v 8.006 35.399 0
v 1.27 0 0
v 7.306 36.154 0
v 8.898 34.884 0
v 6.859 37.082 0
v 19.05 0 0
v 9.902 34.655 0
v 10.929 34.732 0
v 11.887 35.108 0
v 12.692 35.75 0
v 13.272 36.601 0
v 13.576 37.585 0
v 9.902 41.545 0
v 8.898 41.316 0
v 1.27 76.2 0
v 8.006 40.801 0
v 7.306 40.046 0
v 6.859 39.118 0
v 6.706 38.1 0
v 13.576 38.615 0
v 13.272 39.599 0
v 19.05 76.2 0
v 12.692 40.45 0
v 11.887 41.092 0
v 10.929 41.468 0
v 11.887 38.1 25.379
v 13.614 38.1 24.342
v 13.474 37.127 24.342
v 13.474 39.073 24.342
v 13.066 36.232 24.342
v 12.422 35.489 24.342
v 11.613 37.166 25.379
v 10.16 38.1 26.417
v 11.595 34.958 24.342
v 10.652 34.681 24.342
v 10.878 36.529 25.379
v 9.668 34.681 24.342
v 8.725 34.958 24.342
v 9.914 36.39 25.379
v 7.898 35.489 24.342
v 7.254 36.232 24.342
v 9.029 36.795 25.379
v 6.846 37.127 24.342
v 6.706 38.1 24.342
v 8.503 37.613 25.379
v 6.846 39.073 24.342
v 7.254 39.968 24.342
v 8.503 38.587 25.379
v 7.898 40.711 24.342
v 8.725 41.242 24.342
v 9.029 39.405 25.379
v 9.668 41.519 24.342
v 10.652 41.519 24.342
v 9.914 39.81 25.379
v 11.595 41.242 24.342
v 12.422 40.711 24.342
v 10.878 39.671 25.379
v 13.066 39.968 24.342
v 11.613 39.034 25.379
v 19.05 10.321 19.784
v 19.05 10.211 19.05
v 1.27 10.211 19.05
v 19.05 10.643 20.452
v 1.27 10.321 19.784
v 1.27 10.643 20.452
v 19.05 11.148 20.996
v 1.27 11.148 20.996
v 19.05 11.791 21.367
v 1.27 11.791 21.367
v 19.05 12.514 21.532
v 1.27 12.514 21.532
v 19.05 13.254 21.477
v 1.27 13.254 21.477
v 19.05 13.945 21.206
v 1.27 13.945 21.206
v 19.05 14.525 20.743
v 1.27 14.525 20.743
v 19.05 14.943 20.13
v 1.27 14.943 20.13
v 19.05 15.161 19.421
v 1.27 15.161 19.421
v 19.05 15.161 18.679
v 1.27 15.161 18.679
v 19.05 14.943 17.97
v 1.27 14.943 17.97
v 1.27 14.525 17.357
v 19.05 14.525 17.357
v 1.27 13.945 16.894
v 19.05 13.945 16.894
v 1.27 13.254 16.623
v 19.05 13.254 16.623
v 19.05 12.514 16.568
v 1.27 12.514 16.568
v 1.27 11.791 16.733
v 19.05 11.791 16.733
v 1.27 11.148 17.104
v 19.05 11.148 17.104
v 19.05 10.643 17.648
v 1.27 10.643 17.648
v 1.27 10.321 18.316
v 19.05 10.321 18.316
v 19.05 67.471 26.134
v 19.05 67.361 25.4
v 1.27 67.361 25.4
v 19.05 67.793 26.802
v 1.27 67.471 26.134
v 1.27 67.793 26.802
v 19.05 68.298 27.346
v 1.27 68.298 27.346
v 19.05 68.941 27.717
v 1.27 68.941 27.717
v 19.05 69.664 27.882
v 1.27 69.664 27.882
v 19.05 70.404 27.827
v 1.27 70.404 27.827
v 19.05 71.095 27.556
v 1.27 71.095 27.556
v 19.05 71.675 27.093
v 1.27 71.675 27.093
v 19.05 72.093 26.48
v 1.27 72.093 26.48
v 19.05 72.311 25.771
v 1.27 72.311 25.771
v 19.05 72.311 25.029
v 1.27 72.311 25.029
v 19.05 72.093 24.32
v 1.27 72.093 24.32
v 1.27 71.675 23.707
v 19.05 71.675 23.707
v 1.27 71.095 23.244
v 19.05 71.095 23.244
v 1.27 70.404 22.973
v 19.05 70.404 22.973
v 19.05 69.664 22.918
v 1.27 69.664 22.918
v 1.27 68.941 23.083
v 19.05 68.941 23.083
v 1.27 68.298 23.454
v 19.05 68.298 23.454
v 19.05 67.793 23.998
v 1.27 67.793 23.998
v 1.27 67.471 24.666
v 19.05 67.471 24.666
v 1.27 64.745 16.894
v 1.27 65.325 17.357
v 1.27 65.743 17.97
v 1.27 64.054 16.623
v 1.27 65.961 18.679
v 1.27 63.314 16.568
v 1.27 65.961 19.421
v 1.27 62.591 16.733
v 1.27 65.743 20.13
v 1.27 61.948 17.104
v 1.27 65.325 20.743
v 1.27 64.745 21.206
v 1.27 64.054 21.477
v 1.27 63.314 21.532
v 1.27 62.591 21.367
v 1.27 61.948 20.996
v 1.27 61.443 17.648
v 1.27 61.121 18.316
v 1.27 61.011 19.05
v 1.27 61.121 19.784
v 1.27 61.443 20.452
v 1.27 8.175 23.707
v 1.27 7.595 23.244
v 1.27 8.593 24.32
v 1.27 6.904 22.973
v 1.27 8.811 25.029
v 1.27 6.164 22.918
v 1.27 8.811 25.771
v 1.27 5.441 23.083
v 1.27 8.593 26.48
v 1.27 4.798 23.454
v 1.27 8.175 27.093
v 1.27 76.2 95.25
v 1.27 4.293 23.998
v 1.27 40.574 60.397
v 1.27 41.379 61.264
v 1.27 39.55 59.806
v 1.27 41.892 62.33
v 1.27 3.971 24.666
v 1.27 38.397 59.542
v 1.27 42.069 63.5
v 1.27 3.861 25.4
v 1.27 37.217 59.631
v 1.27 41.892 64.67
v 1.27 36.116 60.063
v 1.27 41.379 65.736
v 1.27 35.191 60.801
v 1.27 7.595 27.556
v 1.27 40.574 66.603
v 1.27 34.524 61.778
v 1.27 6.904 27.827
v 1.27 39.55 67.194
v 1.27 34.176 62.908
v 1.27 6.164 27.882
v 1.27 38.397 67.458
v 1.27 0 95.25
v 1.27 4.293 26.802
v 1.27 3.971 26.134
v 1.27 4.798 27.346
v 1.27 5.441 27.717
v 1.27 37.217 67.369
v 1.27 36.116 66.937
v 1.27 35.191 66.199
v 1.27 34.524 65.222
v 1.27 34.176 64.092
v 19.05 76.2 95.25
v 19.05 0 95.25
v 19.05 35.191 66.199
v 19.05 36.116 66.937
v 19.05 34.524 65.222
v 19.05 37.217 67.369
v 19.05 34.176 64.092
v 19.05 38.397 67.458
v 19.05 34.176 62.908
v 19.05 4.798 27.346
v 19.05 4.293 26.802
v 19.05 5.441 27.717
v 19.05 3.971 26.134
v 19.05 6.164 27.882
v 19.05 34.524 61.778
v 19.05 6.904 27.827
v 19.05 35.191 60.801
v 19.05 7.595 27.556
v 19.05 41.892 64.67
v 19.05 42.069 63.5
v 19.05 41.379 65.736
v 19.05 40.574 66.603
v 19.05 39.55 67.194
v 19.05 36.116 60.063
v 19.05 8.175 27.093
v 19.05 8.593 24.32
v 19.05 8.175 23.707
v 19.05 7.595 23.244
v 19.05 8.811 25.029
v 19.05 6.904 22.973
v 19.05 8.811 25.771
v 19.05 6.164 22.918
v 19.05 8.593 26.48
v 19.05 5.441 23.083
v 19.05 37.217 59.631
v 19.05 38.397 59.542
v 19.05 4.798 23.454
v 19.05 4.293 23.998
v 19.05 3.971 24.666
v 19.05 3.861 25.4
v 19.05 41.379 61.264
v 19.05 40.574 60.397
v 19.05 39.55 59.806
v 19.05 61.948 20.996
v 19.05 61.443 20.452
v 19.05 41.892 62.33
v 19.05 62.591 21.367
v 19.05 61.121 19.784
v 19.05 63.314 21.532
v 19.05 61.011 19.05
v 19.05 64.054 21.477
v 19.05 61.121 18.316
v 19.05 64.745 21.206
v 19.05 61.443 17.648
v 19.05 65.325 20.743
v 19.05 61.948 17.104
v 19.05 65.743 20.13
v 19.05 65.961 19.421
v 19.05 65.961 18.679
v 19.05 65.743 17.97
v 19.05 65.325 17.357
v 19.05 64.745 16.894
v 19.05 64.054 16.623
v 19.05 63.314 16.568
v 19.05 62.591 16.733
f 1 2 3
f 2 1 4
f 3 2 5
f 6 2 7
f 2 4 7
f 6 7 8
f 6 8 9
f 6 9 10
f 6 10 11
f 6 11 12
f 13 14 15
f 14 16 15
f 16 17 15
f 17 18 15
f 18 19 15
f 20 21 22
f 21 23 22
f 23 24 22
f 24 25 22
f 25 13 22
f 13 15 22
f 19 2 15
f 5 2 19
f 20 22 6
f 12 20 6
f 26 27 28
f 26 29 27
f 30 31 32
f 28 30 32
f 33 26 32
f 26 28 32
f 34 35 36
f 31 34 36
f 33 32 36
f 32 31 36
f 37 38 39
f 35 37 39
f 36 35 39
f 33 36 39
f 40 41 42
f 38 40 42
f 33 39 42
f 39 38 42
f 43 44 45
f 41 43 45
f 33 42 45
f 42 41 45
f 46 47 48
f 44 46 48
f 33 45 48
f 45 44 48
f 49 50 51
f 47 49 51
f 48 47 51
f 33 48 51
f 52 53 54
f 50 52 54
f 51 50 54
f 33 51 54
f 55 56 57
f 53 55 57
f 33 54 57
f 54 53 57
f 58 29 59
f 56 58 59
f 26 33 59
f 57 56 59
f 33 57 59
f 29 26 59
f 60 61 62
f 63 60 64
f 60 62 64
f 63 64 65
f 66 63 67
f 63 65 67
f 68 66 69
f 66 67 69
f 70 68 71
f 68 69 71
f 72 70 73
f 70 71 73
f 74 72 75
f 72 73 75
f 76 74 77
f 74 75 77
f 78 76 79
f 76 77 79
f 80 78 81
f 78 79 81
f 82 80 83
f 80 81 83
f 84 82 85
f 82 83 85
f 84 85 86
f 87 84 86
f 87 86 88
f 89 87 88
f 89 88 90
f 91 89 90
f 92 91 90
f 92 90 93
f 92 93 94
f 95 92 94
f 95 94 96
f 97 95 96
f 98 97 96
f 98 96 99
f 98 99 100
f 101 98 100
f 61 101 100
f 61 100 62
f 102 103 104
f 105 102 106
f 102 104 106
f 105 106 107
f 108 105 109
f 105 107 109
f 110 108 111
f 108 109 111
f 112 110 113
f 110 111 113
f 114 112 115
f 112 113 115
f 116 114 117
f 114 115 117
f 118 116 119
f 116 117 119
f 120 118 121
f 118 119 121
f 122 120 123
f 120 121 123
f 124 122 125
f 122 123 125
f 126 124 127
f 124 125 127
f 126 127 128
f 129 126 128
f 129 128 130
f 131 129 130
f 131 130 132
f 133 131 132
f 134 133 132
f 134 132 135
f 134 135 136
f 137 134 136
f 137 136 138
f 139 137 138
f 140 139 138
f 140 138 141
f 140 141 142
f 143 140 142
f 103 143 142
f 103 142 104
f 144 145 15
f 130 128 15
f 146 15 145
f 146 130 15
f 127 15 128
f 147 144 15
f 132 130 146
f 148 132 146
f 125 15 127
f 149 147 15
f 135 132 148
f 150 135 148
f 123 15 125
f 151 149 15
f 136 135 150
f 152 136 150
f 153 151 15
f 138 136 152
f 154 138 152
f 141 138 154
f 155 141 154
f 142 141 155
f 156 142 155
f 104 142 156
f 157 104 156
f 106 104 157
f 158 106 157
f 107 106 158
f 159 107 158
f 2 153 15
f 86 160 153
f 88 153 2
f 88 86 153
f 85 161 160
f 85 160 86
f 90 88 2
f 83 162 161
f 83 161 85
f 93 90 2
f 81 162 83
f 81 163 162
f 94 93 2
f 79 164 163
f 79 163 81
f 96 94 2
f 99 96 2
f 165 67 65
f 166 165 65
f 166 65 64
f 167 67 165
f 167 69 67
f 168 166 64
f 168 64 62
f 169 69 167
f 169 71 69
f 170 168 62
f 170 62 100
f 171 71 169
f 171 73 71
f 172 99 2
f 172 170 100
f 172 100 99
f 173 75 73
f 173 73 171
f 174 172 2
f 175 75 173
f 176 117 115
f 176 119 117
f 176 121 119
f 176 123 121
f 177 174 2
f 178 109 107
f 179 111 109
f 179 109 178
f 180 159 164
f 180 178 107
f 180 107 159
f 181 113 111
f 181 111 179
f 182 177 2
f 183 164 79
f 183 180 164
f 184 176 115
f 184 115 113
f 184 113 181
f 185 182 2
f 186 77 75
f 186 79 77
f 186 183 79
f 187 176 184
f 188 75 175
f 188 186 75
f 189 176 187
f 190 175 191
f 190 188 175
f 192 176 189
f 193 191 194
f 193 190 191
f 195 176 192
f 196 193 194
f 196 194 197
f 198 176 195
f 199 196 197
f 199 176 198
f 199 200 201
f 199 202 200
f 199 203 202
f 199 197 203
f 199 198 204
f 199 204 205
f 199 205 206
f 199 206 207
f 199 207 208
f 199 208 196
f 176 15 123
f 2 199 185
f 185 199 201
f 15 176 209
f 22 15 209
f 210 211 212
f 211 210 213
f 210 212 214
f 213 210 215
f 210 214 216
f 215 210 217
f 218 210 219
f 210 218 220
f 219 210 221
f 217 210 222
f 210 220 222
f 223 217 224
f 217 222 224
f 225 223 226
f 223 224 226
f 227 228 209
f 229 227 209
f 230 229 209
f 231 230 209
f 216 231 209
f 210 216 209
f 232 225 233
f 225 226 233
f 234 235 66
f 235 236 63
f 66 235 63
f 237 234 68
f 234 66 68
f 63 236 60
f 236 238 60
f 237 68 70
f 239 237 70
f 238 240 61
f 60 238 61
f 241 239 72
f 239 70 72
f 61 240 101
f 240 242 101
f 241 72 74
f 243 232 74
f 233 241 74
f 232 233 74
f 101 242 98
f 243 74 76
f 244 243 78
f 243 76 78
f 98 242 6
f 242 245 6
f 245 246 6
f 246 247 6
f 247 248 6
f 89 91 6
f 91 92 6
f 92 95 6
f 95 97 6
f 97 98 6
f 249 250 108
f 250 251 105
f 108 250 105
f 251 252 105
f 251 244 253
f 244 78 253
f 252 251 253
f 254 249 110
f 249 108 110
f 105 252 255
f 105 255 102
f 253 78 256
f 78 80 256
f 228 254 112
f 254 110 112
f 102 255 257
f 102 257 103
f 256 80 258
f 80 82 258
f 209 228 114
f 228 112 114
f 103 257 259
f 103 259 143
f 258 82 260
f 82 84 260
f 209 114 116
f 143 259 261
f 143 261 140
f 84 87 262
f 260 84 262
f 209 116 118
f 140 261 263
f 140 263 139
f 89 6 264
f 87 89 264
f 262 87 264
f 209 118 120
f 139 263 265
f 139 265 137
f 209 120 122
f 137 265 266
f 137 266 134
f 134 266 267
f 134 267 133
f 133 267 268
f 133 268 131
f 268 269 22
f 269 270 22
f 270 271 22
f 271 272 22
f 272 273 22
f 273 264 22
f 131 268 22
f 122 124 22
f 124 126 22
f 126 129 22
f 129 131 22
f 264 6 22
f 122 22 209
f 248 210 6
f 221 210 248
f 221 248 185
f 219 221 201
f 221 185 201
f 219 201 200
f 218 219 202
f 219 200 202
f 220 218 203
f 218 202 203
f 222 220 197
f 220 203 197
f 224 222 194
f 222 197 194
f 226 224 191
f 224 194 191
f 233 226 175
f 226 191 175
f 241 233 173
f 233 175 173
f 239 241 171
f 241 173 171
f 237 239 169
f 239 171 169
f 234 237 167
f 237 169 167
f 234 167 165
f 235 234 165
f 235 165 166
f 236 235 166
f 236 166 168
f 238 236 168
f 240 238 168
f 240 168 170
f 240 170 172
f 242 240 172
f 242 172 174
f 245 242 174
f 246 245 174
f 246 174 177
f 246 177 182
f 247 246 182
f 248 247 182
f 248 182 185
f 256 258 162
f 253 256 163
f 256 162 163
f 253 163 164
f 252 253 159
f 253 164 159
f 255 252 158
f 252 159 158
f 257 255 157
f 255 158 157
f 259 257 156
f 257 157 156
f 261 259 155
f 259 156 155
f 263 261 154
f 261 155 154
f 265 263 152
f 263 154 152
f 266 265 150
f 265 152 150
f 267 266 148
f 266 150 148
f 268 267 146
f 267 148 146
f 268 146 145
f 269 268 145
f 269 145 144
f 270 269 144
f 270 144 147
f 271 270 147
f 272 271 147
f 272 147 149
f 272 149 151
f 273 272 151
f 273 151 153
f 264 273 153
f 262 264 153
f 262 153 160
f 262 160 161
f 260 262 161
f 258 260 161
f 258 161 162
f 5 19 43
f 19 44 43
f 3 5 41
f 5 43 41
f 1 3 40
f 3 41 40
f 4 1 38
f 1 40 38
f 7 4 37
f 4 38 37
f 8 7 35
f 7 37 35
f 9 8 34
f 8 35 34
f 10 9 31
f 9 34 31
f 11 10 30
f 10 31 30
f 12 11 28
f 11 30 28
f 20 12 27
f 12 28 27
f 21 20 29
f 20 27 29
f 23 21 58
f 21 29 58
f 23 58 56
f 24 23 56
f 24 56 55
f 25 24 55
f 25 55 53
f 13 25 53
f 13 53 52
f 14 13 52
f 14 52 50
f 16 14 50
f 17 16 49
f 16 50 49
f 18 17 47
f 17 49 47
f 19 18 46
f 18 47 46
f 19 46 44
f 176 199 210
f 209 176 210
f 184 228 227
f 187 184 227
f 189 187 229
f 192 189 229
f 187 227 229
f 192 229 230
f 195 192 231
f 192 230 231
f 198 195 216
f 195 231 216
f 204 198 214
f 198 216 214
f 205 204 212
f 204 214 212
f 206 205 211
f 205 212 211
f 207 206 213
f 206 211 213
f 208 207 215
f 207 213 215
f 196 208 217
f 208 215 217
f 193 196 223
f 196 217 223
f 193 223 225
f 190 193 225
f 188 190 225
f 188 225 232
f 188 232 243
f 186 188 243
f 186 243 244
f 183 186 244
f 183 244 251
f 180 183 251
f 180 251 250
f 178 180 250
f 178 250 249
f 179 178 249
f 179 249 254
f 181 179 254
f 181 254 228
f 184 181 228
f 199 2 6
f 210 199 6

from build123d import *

# Parameters (mm, degrees)
F0_W      = 177.8
F0_H      = 76.2
F1_DEPTH  = 31.75
F2_W      = 19.05
F2_H      = 76.2
F3_DEPTH  = 63.5
F4_W      = 107.95
F4_H      = 38.1
F5_DEPTH  = 31.751
F6_W      = 107.95
F6_H      = 19.05
F7_DEPTH  = 12.7
F8_W      = 76.2
F8_H      = 31.75
F9_DEPTH  = 50.8
F11_D     = 6.5278
F11_DEPTH = 12.7
F11_TIP   = 1.9611489744
F14_D     = 7.9375
F15_W     = 19.05
F15_H     = 19.05
F15_R     = 3.2639
F12_W     = 19.05
F12_H     = 19.05
F12_R     = 3.2639
F16_DEPTH = 107.95
F18_D     = 4.9784
F19_W     = 76.2
F19_H     = 95.25
F19_R     = 2.4892
F19_R_2   = 3.96875
F20_DEPTH = 1.27
F22_D     = 6.9088
F22_DEPTH = 24.3416666667
F22_TIP   = 2.0756129224


with BuildPart() as f1:
    # F0 (on Top) → F1 (new body)
    with BuildSketch(Plane.XY):
        with Locations((88.9, 38.1)):
            Rectangle(F0_W, F0_H)
    extrude(amount=F1_DEPTH)

    # F2 (on face) → F3 (join)
    with BuildSketch(Plane.XY.offset(31.75)):
        with Locations((9.525, 38.1)):
            Rectangle(F2_W, F2_H)
    extrude(amount=F3_DEPTH)

    # F4 (on face) → F5 (cut, through all)
    with BuildSketch(Plane.XY.offset(31.75)):
        with Locations((73.025, 38.1)):
            Rectangle(F4_W, F4_H)
    extrude(amount=-F5_DEPTH, mode=Mode.SUBTRACT)

    # F6 (on face) → F7 (cut)
    with BuildSketch(Plane(origin=(0, 0, 0), x_dir=(1, 0, 0), z_dir=(0, 0, -1))):
        with Locations((73.025, -9.525)):
            Rectangle(F6_W, F6_H)
        with Locations((73.025, -66.675)):
            Rectangle(F6_W, F6_H)
    extrude(amount=-F7_DEPTH, mode=Mode.SUBTRACT)

    # F8 (on face) → F9 (cut)
    with BuildSketch(Plane.YZ.offset(177.8)):
        with Locations((38.1, 15.875)):
            Rectangle(F8_W, F8_H)
    extrude(amount=-F9_DEPTH, mode=Mode.SUBTRACT)

    # F11
    with Locations(Plane.YZ.offset(127)):
        with Locations((66.675, 22.225), (9.525, 22.225)):
            Hole(F11_D / 2, depth=F11_DEPTH)
            with Locations((0, 0, -(F11_DEPTH + F11_TIP / 2))):  # 118° drill point
                Cone(0, F11_D / 2, F11_TIP, mode=Mode.SUBTRACT)

    # F14 (through all)
    with Locations(Plane(origin=(0, 0, 0), x_dir=(0, -1, 0), z_dir=(-1, 0, 0))):
        with Locations((-38.1, 63.5)):
            Hole(F14_D / 2)

    # F15 (on face) + F12 (on face) → F16 (cut)
    with BuildSketch(Plane.YZ.offset(127)):
        with Locations((66.675, 22.225)):
            Rectangle(F15_W, F15_H)
        with Locations((66.675, 22.225)):
            Circle(F15_R, mode=Mode.SUBTRACT)
        with Locations((9.525, 22.225)):
            Rectangle(F15_W, F15_H)
        with Locations((9.525, 22.225)):
            Circle(F15_R, mode=Mode.SUBTRACT)
        with Locations((9.525, 22.225)):
            Circle(F15_R)
    with BuildSketch(Plane.YZ.offset(127)):
        with Locations((66.675, 22.225)):
            Rectangle(F12_W, F12_H)
        with Locations((66.675, 22.225)):
            Circle(F12_R, mode=Mode.SUBTRACT)
        with Locations((66.675, 22.225)):
            Circle(F12_R)
    extrude(amount=-F16_DEPTH, mode=Mode.SUBTRACT)

    # F18 (through all)
    with Locations(Plane.YZ.offset(19.05)):
        with Locations((6.35, 25.4), (12.7, 19.05), (63.5, 19.05), (69.85, 25.4)):
            Hole(F18_D / 2)

    # F19 (on face) → F20 (cut)
    with BuildSketch(Plane(origin=(0, 0, 0), x_dir=(0, -1, 0), z_dir=(-1, 0, 0))):
        with Locations((-38.1, 47.625)):
            Rectangle(F19_W, F19_H)
        with Locations((-63.5, 19.05)):
            Circle(F19_R, mode=Mode.SUBTRACT)
        with Locations((-69.85, 25.4)):
            Circle(F19_R, mode=Mode.SUBTRACT)
        with Locations((-12.7, 19.05)):
            Circle(F19_R, mode=Mode.SUBTRACT)
        with Locations((-6.35, 25.4)):
            Circle(F19_R, mode=Mode.SUBTRACT)
        with Locations((-38.1, 63.5)):
            Circle(F19_R_2, mode=Mode.SUBTRACT)
    extrude(amount=-F20_DEPTH, mode=Mode.SUBTRACT)

    # F22
    with Locations(Plane(origin=(0, 0, 0), x_dir=(1, 0, 0), z_dir=(0, 0, -1))):
        with Locations((10.16, -38.1)):
            Hole(F22_D / 2, depth=F22_DEPTH)
            with Locations((0, 0, -(F22_DEPTH + F22_TIP / 2))):  # 118° drill point
                Cone(0, F22_D / 2, F22_TIP, mode=Mode.SUBTRACT)


solid = f1.part
